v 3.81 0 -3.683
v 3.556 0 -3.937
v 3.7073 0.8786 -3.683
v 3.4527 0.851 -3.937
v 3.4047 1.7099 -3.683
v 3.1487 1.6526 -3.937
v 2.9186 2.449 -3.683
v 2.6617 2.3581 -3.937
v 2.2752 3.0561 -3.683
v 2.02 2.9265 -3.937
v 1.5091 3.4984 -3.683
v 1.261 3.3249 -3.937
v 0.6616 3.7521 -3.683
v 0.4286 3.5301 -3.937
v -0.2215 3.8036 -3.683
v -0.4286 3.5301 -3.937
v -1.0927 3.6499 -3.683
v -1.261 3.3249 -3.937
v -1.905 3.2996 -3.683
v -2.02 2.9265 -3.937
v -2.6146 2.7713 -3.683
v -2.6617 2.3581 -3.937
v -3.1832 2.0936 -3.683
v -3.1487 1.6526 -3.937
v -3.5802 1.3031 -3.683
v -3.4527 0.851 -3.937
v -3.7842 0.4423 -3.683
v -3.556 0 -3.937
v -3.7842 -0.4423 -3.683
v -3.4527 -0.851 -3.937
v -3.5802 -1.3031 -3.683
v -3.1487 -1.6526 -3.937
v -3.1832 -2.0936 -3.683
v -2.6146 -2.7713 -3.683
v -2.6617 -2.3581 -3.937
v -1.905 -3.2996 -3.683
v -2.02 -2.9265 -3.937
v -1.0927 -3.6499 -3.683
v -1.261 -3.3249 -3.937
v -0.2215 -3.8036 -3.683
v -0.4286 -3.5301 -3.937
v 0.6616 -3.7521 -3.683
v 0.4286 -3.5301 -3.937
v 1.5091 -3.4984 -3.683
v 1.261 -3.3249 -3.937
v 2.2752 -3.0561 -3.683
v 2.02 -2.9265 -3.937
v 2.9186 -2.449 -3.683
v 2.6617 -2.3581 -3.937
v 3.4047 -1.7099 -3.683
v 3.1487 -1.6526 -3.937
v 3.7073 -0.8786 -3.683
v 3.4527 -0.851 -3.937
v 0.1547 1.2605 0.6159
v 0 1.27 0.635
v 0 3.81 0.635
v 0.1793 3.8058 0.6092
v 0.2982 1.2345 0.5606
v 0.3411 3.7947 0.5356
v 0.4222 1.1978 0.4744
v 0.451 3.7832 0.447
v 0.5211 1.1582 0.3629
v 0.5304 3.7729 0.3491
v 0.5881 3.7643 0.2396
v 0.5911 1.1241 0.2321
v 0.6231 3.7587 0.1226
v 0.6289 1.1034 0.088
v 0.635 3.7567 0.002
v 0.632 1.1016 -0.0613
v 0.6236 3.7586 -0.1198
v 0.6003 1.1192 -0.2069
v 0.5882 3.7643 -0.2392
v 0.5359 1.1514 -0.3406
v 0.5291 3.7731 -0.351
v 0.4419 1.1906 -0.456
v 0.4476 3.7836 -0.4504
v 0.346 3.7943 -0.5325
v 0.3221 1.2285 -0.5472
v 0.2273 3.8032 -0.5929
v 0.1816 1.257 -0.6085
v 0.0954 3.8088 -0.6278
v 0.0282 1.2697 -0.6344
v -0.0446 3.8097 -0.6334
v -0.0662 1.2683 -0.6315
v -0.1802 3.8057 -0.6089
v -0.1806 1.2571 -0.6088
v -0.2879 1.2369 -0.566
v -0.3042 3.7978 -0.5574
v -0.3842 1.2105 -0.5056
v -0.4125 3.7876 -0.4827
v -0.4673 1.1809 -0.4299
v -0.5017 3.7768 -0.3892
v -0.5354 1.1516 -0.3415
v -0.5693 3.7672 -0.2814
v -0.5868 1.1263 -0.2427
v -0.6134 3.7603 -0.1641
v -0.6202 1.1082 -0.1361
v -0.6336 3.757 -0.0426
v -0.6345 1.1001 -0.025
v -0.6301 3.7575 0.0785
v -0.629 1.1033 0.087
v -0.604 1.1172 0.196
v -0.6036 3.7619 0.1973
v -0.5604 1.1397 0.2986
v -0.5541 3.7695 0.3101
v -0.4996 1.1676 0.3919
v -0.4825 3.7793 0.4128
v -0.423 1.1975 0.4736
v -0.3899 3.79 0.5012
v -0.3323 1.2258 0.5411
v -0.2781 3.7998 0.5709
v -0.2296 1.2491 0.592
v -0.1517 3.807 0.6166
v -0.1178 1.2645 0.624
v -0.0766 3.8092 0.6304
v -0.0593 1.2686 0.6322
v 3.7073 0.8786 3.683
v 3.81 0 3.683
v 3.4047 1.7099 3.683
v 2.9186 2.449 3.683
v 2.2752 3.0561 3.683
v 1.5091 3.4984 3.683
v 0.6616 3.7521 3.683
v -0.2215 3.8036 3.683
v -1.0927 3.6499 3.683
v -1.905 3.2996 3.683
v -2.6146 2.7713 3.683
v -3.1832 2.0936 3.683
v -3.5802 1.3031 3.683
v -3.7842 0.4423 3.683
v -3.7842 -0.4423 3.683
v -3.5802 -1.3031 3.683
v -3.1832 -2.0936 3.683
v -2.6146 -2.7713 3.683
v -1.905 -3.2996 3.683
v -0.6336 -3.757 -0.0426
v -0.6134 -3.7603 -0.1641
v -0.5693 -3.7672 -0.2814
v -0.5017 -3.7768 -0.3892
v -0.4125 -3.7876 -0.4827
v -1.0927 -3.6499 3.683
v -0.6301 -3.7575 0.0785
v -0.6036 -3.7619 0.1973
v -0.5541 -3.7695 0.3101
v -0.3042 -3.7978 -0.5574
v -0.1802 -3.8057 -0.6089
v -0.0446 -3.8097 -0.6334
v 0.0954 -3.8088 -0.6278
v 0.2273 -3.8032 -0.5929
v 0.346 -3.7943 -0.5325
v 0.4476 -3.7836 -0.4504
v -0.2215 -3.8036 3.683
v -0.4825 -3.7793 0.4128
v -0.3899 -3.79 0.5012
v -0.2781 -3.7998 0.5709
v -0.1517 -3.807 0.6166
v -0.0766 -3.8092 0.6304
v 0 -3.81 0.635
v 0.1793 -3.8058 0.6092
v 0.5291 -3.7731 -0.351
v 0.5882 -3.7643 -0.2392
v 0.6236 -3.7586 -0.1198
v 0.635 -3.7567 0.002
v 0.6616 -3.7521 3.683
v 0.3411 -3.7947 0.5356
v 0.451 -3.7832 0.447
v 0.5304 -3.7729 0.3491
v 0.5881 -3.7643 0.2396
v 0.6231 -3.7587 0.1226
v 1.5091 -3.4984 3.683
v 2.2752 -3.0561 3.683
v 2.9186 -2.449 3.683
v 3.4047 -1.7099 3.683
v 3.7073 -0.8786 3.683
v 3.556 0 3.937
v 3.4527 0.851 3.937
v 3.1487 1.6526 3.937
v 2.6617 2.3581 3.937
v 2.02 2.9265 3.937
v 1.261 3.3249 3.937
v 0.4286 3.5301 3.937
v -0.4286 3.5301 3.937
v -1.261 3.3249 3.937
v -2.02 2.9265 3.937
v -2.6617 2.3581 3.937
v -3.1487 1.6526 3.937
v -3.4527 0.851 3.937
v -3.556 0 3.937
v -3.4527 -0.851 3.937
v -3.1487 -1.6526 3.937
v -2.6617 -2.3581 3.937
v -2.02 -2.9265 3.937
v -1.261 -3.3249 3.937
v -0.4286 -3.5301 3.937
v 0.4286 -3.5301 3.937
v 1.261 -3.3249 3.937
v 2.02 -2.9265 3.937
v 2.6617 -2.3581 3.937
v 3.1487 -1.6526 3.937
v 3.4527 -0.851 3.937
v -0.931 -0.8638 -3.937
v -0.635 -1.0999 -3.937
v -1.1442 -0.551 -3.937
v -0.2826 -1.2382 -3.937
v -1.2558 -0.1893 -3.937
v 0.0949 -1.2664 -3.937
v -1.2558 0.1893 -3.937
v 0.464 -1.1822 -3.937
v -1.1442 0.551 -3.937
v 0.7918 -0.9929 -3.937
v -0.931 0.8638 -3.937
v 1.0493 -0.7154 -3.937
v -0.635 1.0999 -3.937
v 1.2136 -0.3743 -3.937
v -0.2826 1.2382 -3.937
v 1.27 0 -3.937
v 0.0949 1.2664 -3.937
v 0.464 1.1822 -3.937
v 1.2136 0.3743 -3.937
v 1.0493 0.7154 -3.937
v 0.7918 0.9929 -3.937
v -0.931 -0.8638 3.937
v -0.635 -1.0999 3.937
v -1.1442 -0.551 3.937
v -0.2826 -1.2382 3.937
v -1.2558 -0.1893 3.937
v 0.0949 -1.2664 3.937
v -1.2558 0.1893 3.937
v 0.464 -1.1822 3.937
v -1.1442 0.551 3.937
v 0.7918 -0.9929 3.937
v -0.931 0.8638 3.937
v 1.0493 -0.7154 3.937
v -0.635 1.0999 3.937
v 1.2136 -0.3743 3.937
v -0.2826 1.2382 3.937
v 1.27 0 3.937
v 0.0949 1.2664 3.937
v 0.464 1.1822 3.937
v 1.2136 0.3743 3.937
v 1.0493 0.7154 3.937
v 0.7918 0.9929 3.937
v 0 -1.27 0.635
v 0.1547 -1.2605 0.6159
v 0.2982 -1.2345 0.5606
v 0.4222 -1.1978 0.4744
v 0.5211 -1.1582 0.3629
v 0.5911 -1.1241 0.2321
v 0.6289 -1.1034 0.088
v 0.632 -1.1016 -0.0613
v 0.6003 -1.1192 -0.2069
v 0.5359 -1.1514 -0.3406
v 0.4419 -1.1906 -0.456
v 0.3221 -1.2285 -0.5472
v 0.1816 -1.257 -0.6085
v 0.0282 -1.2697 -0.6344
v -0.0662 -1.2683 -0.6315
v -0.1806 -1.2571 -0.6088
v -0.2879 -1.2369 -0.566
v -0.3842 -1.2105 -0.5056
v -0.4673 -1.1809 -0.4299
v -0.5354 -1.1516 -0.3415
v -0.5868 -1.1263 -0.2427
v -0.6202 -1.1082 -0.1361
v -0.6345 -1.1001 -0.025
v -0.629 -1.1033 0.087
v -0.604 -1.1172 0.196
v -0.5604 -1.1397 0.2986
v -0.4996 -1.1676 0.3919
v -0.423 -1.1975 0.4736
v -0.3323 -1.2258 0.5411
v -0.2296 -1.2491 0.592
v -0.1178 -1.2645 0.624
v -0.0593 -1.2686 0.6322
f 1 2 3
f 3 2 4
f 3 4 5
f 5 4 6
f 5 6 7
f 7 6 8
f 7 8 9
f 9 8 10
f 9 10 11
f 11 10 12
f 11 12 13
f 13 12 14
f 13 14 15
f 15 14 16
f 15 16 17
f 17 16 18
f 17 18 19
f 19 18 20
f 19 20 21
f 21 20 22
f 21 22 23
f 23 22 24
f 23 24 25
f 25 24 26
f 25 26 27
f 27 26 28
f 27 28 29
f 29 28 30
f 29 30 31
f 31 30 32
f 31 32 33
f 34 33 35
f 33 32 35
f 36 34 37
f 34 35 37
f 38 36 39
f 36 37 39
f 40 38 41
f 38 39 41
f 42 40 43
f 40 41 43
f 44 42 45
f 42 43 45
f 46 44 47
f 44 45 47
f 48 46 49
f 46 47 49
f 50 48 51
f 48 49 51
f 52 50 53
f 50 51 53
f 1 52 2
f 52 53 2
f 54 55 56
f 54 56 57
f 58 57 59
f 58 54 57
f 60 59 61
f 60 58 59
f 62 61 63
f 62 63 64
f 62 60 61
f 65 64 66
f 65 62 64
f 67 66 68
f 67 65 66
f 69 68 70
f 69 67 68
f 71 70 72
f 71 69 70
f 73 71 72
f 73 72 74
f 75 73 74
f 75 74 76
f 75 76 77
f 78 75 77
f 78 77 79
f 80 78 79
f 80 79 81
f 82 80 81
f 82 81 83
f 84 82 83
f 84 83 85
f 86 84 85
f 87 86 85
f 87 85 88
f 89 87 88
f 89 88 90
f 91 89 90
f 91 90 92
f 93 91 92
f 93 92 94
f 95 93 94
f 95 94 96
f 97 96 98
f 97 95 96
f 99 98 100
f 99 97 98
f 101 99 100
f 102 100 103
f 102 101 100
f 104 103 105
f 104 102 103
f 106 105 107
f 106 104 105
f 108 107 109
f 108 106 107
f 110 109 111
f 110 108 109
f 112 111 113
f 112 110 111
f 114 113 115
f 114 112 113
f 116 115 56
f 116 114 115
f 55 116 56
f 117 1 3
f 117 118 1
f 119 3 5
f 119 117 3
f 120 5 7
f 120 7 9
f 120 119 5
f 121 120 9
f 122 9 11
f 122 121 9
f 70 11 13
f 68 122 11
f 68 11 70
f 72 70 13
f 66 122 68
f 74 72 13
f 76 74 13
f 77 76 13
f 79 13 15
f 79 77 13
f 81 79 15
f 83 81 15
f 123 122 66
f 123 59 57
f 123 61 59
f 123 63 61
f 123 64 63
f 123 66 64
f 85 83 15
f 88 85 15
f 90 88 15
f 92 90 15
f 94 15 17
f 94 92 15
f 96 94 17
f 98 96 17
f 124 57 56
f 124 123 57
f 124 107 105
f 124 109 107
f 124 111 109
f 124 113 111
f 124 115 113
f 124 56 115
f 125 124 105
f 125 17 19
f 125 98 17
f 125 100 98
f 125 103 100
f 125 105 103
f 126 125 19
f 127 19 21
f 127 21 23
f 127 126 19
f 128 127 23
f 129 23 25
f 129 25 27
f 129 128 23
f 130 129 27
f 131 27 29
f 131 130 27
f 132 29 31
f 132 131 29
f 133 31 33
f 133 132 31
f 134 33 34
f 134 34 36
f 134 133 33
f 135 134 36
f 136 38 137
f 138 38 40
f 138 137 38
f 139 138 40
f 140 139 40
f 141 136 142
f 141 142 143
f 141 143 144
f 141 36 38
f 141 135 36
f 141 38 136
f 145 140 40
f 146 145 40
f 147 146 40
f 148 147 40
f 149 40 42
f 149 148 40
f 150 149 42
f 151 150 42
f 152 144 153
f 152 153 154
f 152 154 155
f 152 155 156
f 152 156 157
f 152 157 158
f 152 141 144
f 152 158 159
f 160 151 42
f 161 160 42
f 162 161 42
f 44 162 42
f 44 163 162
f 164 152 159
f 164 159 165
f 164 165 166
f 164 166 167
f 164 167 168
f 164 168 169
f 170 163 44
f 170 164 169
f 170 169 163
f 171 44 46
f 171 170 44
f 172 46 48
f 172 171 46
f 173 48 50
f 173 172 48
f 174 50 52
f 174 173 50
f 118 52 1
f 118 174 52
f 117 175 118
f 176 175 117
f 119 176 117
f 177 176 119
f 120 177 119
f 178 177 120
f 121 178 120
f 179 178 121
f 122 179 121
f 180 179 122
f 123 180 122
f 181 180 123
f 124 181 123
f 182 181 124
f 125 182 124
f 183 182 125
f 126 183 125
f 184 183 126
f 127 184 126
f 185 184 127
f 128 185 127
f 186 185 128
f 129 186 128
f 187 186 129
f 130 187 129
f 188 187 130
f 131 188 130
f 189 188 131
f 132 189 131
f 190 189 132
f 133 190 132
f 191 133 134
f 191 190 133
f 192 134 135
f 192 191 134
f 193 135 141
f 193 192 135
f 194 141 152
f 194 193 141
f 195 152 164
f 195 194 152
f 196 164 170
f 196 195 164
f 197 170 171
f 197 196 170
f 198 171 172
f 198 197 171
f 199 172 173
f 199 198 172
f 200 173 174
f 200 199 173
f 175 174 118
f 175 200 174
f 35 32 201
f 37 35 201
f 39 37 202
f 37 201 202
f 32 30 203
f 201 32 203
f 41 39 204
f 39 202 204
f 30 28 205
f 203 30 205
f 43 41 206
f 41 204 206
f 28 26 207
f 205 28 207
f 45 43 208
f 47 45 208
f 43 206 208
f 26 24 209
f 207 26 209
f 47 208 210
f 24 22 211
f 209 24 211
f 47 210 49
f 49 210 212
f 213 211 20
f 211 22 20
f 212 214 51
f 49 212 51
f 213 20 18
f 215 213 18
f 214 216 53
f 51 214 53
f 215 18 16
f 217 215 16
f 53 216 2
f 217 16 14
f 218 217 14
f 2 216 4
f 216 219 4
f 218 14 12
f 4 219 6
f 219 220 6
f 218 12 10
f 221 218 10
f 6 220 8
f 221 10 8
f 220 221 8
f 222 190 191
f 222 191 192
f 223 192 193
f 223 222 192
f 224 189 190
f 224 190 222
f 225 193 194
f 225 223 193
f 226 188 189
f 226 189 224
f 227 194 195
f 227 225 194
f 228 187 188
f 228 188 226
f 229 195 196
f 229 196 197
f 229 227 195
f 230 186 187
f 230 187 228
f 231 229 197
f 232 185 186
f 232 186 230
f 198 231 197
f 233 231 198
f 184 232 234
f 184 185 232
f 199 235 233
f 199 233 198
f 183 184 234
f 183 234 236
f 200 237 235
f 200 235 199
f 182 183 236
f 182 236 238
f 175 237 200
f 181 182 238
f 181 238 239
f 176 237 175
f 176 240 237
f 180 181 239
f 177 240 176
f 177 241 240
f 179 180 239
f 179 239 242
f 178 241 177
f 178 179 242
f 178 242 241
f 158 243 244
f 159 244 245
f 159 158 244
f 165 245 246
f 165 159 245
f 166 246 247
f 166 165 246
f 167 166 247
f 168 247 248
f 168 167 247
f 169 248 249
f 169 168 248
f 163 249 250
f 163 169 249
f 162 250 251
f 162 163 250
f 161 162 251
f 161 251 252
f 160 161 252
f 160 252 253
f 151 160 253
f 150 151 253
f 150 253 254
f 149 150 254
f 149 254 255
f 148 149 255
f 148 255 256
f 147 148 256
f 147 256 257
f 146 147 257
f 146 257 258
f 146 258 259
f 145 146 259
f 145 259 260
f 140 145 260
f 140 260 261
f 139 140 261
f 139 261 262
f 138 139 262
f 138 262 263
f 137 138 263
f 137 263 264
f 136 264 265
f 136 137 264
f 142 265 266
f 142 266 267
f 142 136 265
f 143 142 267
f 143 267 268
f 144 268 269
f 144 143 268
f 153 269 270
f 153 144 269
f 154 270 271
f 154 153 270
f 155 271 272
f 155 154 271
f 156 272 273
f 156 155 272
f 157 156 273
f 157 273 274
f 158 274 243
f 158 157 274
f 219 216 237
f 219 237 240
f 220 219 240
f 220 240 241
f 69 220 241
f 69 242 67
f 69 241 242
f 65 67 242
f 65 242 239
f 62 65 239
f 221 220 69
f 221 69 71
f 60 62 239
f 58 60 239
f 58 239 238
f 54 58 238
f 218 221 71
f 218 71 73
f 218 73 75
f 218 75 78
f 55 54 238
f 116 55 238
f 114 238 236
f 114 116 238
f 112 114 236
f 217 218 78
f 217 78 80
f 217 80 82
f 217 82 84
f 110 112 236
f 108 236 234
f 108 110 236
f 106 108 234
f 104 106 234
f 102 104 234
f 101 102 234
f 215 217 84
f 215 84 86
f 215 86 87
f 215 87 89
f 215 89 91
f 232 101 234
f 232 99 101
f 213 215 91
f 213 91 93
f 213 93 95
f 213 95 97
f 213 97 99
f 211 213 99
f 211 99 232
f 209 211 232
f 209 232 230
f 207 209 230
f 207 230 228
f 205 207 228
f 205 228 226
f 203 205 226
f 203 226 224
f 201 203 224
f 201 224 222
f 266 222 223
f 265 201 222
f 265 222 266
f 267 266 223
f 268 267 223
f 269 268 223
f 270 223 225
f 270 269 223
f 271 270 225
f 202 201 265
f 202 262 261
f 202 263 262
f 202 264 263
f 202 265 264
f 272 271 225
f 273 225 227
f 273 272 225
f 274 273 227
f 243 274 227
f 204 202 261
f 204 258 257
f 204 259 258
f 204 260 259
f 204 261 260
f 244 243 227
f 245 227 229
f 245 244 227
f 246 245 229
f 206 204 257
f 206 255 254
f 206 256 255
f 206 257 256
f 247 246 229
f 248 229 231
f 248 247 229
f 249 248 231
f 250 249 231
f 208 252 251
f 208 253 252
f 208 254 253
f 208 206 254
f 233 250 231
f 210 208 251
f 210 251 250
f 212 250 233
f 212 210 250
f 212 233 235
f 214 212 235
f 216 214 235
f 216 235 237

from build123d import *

# Parameters (mm, degrees)
SKETCH1_R               = 3.81
EXTRUDE1_DEPTH          = 3.937
CHAMFER1_SIZE           = 0.254
CUT_EXTRUDE1_DEPTH      = 7.673242765
CUT_EXTRUDE1_DEPTH_BACK = 7.673242765
SKETCH2_R               = 1.27
CUT_EXTRUDE2_DEPTH      = 7.673242765
CUT_EXTRUDE2_DEPTH_BACK = 7.673242765
SKETCH3_R               = 0.635


with BuildPart() as part:
    # Sketch1 → Extrude1 (new, symmetric)
    with BuildSketch(Plane.XY):
        Circle(SKETCH1_R)
    extrude(amount=EXTRUDE1_DEPTH, both=True)

    # Chamfer1
    chamfer1_edges = [part.edges().sort_by_distance(p)[0] for p in [
        (-3.81, 0, -3.937),
        (-3.81, 0, 3.937),
    ]]
    chamfer(chamfer1_edges, length=CHAMFER1_SIZE)

    # Sketch2 → Cut-Extrude1 (cut, two sides: drawn at the far end of the back side and taken through both)
    with BuildSketch(Plane.XY.offset(-CUT_EXTRUDE1_DEPTH_BACK)):
        Circle(SKETCH2_R)
    extrude(amount=CUT_EXTRUDE1_DEPTH + CUT_EXTRUDE1_DEPTH_BACK, mode=Mode.SUBTRACT)

    # Sketch3 → Cut-Extrude2 (cut, two sides: drawn at the far end of the back side and taken through both)
    with BuildSketch(Plane(origin=(0, 0, 0), x_dir=(1, 0, 0), z_dir=(0, 1, 0)).offset(-CUT_EXTRUDE2_DEPTH_BACK)):
        with Locations(Location((0, 0, 0), (0, 0, 270))):
            Circle(SKETCH3_R)
    extrude(amount=CUT_EXTRUDE2_DEPTH + CUT_EXTRUDE2_DEPTH_BACK, mode=Mode.SUBTRACT)


solid = part.part
